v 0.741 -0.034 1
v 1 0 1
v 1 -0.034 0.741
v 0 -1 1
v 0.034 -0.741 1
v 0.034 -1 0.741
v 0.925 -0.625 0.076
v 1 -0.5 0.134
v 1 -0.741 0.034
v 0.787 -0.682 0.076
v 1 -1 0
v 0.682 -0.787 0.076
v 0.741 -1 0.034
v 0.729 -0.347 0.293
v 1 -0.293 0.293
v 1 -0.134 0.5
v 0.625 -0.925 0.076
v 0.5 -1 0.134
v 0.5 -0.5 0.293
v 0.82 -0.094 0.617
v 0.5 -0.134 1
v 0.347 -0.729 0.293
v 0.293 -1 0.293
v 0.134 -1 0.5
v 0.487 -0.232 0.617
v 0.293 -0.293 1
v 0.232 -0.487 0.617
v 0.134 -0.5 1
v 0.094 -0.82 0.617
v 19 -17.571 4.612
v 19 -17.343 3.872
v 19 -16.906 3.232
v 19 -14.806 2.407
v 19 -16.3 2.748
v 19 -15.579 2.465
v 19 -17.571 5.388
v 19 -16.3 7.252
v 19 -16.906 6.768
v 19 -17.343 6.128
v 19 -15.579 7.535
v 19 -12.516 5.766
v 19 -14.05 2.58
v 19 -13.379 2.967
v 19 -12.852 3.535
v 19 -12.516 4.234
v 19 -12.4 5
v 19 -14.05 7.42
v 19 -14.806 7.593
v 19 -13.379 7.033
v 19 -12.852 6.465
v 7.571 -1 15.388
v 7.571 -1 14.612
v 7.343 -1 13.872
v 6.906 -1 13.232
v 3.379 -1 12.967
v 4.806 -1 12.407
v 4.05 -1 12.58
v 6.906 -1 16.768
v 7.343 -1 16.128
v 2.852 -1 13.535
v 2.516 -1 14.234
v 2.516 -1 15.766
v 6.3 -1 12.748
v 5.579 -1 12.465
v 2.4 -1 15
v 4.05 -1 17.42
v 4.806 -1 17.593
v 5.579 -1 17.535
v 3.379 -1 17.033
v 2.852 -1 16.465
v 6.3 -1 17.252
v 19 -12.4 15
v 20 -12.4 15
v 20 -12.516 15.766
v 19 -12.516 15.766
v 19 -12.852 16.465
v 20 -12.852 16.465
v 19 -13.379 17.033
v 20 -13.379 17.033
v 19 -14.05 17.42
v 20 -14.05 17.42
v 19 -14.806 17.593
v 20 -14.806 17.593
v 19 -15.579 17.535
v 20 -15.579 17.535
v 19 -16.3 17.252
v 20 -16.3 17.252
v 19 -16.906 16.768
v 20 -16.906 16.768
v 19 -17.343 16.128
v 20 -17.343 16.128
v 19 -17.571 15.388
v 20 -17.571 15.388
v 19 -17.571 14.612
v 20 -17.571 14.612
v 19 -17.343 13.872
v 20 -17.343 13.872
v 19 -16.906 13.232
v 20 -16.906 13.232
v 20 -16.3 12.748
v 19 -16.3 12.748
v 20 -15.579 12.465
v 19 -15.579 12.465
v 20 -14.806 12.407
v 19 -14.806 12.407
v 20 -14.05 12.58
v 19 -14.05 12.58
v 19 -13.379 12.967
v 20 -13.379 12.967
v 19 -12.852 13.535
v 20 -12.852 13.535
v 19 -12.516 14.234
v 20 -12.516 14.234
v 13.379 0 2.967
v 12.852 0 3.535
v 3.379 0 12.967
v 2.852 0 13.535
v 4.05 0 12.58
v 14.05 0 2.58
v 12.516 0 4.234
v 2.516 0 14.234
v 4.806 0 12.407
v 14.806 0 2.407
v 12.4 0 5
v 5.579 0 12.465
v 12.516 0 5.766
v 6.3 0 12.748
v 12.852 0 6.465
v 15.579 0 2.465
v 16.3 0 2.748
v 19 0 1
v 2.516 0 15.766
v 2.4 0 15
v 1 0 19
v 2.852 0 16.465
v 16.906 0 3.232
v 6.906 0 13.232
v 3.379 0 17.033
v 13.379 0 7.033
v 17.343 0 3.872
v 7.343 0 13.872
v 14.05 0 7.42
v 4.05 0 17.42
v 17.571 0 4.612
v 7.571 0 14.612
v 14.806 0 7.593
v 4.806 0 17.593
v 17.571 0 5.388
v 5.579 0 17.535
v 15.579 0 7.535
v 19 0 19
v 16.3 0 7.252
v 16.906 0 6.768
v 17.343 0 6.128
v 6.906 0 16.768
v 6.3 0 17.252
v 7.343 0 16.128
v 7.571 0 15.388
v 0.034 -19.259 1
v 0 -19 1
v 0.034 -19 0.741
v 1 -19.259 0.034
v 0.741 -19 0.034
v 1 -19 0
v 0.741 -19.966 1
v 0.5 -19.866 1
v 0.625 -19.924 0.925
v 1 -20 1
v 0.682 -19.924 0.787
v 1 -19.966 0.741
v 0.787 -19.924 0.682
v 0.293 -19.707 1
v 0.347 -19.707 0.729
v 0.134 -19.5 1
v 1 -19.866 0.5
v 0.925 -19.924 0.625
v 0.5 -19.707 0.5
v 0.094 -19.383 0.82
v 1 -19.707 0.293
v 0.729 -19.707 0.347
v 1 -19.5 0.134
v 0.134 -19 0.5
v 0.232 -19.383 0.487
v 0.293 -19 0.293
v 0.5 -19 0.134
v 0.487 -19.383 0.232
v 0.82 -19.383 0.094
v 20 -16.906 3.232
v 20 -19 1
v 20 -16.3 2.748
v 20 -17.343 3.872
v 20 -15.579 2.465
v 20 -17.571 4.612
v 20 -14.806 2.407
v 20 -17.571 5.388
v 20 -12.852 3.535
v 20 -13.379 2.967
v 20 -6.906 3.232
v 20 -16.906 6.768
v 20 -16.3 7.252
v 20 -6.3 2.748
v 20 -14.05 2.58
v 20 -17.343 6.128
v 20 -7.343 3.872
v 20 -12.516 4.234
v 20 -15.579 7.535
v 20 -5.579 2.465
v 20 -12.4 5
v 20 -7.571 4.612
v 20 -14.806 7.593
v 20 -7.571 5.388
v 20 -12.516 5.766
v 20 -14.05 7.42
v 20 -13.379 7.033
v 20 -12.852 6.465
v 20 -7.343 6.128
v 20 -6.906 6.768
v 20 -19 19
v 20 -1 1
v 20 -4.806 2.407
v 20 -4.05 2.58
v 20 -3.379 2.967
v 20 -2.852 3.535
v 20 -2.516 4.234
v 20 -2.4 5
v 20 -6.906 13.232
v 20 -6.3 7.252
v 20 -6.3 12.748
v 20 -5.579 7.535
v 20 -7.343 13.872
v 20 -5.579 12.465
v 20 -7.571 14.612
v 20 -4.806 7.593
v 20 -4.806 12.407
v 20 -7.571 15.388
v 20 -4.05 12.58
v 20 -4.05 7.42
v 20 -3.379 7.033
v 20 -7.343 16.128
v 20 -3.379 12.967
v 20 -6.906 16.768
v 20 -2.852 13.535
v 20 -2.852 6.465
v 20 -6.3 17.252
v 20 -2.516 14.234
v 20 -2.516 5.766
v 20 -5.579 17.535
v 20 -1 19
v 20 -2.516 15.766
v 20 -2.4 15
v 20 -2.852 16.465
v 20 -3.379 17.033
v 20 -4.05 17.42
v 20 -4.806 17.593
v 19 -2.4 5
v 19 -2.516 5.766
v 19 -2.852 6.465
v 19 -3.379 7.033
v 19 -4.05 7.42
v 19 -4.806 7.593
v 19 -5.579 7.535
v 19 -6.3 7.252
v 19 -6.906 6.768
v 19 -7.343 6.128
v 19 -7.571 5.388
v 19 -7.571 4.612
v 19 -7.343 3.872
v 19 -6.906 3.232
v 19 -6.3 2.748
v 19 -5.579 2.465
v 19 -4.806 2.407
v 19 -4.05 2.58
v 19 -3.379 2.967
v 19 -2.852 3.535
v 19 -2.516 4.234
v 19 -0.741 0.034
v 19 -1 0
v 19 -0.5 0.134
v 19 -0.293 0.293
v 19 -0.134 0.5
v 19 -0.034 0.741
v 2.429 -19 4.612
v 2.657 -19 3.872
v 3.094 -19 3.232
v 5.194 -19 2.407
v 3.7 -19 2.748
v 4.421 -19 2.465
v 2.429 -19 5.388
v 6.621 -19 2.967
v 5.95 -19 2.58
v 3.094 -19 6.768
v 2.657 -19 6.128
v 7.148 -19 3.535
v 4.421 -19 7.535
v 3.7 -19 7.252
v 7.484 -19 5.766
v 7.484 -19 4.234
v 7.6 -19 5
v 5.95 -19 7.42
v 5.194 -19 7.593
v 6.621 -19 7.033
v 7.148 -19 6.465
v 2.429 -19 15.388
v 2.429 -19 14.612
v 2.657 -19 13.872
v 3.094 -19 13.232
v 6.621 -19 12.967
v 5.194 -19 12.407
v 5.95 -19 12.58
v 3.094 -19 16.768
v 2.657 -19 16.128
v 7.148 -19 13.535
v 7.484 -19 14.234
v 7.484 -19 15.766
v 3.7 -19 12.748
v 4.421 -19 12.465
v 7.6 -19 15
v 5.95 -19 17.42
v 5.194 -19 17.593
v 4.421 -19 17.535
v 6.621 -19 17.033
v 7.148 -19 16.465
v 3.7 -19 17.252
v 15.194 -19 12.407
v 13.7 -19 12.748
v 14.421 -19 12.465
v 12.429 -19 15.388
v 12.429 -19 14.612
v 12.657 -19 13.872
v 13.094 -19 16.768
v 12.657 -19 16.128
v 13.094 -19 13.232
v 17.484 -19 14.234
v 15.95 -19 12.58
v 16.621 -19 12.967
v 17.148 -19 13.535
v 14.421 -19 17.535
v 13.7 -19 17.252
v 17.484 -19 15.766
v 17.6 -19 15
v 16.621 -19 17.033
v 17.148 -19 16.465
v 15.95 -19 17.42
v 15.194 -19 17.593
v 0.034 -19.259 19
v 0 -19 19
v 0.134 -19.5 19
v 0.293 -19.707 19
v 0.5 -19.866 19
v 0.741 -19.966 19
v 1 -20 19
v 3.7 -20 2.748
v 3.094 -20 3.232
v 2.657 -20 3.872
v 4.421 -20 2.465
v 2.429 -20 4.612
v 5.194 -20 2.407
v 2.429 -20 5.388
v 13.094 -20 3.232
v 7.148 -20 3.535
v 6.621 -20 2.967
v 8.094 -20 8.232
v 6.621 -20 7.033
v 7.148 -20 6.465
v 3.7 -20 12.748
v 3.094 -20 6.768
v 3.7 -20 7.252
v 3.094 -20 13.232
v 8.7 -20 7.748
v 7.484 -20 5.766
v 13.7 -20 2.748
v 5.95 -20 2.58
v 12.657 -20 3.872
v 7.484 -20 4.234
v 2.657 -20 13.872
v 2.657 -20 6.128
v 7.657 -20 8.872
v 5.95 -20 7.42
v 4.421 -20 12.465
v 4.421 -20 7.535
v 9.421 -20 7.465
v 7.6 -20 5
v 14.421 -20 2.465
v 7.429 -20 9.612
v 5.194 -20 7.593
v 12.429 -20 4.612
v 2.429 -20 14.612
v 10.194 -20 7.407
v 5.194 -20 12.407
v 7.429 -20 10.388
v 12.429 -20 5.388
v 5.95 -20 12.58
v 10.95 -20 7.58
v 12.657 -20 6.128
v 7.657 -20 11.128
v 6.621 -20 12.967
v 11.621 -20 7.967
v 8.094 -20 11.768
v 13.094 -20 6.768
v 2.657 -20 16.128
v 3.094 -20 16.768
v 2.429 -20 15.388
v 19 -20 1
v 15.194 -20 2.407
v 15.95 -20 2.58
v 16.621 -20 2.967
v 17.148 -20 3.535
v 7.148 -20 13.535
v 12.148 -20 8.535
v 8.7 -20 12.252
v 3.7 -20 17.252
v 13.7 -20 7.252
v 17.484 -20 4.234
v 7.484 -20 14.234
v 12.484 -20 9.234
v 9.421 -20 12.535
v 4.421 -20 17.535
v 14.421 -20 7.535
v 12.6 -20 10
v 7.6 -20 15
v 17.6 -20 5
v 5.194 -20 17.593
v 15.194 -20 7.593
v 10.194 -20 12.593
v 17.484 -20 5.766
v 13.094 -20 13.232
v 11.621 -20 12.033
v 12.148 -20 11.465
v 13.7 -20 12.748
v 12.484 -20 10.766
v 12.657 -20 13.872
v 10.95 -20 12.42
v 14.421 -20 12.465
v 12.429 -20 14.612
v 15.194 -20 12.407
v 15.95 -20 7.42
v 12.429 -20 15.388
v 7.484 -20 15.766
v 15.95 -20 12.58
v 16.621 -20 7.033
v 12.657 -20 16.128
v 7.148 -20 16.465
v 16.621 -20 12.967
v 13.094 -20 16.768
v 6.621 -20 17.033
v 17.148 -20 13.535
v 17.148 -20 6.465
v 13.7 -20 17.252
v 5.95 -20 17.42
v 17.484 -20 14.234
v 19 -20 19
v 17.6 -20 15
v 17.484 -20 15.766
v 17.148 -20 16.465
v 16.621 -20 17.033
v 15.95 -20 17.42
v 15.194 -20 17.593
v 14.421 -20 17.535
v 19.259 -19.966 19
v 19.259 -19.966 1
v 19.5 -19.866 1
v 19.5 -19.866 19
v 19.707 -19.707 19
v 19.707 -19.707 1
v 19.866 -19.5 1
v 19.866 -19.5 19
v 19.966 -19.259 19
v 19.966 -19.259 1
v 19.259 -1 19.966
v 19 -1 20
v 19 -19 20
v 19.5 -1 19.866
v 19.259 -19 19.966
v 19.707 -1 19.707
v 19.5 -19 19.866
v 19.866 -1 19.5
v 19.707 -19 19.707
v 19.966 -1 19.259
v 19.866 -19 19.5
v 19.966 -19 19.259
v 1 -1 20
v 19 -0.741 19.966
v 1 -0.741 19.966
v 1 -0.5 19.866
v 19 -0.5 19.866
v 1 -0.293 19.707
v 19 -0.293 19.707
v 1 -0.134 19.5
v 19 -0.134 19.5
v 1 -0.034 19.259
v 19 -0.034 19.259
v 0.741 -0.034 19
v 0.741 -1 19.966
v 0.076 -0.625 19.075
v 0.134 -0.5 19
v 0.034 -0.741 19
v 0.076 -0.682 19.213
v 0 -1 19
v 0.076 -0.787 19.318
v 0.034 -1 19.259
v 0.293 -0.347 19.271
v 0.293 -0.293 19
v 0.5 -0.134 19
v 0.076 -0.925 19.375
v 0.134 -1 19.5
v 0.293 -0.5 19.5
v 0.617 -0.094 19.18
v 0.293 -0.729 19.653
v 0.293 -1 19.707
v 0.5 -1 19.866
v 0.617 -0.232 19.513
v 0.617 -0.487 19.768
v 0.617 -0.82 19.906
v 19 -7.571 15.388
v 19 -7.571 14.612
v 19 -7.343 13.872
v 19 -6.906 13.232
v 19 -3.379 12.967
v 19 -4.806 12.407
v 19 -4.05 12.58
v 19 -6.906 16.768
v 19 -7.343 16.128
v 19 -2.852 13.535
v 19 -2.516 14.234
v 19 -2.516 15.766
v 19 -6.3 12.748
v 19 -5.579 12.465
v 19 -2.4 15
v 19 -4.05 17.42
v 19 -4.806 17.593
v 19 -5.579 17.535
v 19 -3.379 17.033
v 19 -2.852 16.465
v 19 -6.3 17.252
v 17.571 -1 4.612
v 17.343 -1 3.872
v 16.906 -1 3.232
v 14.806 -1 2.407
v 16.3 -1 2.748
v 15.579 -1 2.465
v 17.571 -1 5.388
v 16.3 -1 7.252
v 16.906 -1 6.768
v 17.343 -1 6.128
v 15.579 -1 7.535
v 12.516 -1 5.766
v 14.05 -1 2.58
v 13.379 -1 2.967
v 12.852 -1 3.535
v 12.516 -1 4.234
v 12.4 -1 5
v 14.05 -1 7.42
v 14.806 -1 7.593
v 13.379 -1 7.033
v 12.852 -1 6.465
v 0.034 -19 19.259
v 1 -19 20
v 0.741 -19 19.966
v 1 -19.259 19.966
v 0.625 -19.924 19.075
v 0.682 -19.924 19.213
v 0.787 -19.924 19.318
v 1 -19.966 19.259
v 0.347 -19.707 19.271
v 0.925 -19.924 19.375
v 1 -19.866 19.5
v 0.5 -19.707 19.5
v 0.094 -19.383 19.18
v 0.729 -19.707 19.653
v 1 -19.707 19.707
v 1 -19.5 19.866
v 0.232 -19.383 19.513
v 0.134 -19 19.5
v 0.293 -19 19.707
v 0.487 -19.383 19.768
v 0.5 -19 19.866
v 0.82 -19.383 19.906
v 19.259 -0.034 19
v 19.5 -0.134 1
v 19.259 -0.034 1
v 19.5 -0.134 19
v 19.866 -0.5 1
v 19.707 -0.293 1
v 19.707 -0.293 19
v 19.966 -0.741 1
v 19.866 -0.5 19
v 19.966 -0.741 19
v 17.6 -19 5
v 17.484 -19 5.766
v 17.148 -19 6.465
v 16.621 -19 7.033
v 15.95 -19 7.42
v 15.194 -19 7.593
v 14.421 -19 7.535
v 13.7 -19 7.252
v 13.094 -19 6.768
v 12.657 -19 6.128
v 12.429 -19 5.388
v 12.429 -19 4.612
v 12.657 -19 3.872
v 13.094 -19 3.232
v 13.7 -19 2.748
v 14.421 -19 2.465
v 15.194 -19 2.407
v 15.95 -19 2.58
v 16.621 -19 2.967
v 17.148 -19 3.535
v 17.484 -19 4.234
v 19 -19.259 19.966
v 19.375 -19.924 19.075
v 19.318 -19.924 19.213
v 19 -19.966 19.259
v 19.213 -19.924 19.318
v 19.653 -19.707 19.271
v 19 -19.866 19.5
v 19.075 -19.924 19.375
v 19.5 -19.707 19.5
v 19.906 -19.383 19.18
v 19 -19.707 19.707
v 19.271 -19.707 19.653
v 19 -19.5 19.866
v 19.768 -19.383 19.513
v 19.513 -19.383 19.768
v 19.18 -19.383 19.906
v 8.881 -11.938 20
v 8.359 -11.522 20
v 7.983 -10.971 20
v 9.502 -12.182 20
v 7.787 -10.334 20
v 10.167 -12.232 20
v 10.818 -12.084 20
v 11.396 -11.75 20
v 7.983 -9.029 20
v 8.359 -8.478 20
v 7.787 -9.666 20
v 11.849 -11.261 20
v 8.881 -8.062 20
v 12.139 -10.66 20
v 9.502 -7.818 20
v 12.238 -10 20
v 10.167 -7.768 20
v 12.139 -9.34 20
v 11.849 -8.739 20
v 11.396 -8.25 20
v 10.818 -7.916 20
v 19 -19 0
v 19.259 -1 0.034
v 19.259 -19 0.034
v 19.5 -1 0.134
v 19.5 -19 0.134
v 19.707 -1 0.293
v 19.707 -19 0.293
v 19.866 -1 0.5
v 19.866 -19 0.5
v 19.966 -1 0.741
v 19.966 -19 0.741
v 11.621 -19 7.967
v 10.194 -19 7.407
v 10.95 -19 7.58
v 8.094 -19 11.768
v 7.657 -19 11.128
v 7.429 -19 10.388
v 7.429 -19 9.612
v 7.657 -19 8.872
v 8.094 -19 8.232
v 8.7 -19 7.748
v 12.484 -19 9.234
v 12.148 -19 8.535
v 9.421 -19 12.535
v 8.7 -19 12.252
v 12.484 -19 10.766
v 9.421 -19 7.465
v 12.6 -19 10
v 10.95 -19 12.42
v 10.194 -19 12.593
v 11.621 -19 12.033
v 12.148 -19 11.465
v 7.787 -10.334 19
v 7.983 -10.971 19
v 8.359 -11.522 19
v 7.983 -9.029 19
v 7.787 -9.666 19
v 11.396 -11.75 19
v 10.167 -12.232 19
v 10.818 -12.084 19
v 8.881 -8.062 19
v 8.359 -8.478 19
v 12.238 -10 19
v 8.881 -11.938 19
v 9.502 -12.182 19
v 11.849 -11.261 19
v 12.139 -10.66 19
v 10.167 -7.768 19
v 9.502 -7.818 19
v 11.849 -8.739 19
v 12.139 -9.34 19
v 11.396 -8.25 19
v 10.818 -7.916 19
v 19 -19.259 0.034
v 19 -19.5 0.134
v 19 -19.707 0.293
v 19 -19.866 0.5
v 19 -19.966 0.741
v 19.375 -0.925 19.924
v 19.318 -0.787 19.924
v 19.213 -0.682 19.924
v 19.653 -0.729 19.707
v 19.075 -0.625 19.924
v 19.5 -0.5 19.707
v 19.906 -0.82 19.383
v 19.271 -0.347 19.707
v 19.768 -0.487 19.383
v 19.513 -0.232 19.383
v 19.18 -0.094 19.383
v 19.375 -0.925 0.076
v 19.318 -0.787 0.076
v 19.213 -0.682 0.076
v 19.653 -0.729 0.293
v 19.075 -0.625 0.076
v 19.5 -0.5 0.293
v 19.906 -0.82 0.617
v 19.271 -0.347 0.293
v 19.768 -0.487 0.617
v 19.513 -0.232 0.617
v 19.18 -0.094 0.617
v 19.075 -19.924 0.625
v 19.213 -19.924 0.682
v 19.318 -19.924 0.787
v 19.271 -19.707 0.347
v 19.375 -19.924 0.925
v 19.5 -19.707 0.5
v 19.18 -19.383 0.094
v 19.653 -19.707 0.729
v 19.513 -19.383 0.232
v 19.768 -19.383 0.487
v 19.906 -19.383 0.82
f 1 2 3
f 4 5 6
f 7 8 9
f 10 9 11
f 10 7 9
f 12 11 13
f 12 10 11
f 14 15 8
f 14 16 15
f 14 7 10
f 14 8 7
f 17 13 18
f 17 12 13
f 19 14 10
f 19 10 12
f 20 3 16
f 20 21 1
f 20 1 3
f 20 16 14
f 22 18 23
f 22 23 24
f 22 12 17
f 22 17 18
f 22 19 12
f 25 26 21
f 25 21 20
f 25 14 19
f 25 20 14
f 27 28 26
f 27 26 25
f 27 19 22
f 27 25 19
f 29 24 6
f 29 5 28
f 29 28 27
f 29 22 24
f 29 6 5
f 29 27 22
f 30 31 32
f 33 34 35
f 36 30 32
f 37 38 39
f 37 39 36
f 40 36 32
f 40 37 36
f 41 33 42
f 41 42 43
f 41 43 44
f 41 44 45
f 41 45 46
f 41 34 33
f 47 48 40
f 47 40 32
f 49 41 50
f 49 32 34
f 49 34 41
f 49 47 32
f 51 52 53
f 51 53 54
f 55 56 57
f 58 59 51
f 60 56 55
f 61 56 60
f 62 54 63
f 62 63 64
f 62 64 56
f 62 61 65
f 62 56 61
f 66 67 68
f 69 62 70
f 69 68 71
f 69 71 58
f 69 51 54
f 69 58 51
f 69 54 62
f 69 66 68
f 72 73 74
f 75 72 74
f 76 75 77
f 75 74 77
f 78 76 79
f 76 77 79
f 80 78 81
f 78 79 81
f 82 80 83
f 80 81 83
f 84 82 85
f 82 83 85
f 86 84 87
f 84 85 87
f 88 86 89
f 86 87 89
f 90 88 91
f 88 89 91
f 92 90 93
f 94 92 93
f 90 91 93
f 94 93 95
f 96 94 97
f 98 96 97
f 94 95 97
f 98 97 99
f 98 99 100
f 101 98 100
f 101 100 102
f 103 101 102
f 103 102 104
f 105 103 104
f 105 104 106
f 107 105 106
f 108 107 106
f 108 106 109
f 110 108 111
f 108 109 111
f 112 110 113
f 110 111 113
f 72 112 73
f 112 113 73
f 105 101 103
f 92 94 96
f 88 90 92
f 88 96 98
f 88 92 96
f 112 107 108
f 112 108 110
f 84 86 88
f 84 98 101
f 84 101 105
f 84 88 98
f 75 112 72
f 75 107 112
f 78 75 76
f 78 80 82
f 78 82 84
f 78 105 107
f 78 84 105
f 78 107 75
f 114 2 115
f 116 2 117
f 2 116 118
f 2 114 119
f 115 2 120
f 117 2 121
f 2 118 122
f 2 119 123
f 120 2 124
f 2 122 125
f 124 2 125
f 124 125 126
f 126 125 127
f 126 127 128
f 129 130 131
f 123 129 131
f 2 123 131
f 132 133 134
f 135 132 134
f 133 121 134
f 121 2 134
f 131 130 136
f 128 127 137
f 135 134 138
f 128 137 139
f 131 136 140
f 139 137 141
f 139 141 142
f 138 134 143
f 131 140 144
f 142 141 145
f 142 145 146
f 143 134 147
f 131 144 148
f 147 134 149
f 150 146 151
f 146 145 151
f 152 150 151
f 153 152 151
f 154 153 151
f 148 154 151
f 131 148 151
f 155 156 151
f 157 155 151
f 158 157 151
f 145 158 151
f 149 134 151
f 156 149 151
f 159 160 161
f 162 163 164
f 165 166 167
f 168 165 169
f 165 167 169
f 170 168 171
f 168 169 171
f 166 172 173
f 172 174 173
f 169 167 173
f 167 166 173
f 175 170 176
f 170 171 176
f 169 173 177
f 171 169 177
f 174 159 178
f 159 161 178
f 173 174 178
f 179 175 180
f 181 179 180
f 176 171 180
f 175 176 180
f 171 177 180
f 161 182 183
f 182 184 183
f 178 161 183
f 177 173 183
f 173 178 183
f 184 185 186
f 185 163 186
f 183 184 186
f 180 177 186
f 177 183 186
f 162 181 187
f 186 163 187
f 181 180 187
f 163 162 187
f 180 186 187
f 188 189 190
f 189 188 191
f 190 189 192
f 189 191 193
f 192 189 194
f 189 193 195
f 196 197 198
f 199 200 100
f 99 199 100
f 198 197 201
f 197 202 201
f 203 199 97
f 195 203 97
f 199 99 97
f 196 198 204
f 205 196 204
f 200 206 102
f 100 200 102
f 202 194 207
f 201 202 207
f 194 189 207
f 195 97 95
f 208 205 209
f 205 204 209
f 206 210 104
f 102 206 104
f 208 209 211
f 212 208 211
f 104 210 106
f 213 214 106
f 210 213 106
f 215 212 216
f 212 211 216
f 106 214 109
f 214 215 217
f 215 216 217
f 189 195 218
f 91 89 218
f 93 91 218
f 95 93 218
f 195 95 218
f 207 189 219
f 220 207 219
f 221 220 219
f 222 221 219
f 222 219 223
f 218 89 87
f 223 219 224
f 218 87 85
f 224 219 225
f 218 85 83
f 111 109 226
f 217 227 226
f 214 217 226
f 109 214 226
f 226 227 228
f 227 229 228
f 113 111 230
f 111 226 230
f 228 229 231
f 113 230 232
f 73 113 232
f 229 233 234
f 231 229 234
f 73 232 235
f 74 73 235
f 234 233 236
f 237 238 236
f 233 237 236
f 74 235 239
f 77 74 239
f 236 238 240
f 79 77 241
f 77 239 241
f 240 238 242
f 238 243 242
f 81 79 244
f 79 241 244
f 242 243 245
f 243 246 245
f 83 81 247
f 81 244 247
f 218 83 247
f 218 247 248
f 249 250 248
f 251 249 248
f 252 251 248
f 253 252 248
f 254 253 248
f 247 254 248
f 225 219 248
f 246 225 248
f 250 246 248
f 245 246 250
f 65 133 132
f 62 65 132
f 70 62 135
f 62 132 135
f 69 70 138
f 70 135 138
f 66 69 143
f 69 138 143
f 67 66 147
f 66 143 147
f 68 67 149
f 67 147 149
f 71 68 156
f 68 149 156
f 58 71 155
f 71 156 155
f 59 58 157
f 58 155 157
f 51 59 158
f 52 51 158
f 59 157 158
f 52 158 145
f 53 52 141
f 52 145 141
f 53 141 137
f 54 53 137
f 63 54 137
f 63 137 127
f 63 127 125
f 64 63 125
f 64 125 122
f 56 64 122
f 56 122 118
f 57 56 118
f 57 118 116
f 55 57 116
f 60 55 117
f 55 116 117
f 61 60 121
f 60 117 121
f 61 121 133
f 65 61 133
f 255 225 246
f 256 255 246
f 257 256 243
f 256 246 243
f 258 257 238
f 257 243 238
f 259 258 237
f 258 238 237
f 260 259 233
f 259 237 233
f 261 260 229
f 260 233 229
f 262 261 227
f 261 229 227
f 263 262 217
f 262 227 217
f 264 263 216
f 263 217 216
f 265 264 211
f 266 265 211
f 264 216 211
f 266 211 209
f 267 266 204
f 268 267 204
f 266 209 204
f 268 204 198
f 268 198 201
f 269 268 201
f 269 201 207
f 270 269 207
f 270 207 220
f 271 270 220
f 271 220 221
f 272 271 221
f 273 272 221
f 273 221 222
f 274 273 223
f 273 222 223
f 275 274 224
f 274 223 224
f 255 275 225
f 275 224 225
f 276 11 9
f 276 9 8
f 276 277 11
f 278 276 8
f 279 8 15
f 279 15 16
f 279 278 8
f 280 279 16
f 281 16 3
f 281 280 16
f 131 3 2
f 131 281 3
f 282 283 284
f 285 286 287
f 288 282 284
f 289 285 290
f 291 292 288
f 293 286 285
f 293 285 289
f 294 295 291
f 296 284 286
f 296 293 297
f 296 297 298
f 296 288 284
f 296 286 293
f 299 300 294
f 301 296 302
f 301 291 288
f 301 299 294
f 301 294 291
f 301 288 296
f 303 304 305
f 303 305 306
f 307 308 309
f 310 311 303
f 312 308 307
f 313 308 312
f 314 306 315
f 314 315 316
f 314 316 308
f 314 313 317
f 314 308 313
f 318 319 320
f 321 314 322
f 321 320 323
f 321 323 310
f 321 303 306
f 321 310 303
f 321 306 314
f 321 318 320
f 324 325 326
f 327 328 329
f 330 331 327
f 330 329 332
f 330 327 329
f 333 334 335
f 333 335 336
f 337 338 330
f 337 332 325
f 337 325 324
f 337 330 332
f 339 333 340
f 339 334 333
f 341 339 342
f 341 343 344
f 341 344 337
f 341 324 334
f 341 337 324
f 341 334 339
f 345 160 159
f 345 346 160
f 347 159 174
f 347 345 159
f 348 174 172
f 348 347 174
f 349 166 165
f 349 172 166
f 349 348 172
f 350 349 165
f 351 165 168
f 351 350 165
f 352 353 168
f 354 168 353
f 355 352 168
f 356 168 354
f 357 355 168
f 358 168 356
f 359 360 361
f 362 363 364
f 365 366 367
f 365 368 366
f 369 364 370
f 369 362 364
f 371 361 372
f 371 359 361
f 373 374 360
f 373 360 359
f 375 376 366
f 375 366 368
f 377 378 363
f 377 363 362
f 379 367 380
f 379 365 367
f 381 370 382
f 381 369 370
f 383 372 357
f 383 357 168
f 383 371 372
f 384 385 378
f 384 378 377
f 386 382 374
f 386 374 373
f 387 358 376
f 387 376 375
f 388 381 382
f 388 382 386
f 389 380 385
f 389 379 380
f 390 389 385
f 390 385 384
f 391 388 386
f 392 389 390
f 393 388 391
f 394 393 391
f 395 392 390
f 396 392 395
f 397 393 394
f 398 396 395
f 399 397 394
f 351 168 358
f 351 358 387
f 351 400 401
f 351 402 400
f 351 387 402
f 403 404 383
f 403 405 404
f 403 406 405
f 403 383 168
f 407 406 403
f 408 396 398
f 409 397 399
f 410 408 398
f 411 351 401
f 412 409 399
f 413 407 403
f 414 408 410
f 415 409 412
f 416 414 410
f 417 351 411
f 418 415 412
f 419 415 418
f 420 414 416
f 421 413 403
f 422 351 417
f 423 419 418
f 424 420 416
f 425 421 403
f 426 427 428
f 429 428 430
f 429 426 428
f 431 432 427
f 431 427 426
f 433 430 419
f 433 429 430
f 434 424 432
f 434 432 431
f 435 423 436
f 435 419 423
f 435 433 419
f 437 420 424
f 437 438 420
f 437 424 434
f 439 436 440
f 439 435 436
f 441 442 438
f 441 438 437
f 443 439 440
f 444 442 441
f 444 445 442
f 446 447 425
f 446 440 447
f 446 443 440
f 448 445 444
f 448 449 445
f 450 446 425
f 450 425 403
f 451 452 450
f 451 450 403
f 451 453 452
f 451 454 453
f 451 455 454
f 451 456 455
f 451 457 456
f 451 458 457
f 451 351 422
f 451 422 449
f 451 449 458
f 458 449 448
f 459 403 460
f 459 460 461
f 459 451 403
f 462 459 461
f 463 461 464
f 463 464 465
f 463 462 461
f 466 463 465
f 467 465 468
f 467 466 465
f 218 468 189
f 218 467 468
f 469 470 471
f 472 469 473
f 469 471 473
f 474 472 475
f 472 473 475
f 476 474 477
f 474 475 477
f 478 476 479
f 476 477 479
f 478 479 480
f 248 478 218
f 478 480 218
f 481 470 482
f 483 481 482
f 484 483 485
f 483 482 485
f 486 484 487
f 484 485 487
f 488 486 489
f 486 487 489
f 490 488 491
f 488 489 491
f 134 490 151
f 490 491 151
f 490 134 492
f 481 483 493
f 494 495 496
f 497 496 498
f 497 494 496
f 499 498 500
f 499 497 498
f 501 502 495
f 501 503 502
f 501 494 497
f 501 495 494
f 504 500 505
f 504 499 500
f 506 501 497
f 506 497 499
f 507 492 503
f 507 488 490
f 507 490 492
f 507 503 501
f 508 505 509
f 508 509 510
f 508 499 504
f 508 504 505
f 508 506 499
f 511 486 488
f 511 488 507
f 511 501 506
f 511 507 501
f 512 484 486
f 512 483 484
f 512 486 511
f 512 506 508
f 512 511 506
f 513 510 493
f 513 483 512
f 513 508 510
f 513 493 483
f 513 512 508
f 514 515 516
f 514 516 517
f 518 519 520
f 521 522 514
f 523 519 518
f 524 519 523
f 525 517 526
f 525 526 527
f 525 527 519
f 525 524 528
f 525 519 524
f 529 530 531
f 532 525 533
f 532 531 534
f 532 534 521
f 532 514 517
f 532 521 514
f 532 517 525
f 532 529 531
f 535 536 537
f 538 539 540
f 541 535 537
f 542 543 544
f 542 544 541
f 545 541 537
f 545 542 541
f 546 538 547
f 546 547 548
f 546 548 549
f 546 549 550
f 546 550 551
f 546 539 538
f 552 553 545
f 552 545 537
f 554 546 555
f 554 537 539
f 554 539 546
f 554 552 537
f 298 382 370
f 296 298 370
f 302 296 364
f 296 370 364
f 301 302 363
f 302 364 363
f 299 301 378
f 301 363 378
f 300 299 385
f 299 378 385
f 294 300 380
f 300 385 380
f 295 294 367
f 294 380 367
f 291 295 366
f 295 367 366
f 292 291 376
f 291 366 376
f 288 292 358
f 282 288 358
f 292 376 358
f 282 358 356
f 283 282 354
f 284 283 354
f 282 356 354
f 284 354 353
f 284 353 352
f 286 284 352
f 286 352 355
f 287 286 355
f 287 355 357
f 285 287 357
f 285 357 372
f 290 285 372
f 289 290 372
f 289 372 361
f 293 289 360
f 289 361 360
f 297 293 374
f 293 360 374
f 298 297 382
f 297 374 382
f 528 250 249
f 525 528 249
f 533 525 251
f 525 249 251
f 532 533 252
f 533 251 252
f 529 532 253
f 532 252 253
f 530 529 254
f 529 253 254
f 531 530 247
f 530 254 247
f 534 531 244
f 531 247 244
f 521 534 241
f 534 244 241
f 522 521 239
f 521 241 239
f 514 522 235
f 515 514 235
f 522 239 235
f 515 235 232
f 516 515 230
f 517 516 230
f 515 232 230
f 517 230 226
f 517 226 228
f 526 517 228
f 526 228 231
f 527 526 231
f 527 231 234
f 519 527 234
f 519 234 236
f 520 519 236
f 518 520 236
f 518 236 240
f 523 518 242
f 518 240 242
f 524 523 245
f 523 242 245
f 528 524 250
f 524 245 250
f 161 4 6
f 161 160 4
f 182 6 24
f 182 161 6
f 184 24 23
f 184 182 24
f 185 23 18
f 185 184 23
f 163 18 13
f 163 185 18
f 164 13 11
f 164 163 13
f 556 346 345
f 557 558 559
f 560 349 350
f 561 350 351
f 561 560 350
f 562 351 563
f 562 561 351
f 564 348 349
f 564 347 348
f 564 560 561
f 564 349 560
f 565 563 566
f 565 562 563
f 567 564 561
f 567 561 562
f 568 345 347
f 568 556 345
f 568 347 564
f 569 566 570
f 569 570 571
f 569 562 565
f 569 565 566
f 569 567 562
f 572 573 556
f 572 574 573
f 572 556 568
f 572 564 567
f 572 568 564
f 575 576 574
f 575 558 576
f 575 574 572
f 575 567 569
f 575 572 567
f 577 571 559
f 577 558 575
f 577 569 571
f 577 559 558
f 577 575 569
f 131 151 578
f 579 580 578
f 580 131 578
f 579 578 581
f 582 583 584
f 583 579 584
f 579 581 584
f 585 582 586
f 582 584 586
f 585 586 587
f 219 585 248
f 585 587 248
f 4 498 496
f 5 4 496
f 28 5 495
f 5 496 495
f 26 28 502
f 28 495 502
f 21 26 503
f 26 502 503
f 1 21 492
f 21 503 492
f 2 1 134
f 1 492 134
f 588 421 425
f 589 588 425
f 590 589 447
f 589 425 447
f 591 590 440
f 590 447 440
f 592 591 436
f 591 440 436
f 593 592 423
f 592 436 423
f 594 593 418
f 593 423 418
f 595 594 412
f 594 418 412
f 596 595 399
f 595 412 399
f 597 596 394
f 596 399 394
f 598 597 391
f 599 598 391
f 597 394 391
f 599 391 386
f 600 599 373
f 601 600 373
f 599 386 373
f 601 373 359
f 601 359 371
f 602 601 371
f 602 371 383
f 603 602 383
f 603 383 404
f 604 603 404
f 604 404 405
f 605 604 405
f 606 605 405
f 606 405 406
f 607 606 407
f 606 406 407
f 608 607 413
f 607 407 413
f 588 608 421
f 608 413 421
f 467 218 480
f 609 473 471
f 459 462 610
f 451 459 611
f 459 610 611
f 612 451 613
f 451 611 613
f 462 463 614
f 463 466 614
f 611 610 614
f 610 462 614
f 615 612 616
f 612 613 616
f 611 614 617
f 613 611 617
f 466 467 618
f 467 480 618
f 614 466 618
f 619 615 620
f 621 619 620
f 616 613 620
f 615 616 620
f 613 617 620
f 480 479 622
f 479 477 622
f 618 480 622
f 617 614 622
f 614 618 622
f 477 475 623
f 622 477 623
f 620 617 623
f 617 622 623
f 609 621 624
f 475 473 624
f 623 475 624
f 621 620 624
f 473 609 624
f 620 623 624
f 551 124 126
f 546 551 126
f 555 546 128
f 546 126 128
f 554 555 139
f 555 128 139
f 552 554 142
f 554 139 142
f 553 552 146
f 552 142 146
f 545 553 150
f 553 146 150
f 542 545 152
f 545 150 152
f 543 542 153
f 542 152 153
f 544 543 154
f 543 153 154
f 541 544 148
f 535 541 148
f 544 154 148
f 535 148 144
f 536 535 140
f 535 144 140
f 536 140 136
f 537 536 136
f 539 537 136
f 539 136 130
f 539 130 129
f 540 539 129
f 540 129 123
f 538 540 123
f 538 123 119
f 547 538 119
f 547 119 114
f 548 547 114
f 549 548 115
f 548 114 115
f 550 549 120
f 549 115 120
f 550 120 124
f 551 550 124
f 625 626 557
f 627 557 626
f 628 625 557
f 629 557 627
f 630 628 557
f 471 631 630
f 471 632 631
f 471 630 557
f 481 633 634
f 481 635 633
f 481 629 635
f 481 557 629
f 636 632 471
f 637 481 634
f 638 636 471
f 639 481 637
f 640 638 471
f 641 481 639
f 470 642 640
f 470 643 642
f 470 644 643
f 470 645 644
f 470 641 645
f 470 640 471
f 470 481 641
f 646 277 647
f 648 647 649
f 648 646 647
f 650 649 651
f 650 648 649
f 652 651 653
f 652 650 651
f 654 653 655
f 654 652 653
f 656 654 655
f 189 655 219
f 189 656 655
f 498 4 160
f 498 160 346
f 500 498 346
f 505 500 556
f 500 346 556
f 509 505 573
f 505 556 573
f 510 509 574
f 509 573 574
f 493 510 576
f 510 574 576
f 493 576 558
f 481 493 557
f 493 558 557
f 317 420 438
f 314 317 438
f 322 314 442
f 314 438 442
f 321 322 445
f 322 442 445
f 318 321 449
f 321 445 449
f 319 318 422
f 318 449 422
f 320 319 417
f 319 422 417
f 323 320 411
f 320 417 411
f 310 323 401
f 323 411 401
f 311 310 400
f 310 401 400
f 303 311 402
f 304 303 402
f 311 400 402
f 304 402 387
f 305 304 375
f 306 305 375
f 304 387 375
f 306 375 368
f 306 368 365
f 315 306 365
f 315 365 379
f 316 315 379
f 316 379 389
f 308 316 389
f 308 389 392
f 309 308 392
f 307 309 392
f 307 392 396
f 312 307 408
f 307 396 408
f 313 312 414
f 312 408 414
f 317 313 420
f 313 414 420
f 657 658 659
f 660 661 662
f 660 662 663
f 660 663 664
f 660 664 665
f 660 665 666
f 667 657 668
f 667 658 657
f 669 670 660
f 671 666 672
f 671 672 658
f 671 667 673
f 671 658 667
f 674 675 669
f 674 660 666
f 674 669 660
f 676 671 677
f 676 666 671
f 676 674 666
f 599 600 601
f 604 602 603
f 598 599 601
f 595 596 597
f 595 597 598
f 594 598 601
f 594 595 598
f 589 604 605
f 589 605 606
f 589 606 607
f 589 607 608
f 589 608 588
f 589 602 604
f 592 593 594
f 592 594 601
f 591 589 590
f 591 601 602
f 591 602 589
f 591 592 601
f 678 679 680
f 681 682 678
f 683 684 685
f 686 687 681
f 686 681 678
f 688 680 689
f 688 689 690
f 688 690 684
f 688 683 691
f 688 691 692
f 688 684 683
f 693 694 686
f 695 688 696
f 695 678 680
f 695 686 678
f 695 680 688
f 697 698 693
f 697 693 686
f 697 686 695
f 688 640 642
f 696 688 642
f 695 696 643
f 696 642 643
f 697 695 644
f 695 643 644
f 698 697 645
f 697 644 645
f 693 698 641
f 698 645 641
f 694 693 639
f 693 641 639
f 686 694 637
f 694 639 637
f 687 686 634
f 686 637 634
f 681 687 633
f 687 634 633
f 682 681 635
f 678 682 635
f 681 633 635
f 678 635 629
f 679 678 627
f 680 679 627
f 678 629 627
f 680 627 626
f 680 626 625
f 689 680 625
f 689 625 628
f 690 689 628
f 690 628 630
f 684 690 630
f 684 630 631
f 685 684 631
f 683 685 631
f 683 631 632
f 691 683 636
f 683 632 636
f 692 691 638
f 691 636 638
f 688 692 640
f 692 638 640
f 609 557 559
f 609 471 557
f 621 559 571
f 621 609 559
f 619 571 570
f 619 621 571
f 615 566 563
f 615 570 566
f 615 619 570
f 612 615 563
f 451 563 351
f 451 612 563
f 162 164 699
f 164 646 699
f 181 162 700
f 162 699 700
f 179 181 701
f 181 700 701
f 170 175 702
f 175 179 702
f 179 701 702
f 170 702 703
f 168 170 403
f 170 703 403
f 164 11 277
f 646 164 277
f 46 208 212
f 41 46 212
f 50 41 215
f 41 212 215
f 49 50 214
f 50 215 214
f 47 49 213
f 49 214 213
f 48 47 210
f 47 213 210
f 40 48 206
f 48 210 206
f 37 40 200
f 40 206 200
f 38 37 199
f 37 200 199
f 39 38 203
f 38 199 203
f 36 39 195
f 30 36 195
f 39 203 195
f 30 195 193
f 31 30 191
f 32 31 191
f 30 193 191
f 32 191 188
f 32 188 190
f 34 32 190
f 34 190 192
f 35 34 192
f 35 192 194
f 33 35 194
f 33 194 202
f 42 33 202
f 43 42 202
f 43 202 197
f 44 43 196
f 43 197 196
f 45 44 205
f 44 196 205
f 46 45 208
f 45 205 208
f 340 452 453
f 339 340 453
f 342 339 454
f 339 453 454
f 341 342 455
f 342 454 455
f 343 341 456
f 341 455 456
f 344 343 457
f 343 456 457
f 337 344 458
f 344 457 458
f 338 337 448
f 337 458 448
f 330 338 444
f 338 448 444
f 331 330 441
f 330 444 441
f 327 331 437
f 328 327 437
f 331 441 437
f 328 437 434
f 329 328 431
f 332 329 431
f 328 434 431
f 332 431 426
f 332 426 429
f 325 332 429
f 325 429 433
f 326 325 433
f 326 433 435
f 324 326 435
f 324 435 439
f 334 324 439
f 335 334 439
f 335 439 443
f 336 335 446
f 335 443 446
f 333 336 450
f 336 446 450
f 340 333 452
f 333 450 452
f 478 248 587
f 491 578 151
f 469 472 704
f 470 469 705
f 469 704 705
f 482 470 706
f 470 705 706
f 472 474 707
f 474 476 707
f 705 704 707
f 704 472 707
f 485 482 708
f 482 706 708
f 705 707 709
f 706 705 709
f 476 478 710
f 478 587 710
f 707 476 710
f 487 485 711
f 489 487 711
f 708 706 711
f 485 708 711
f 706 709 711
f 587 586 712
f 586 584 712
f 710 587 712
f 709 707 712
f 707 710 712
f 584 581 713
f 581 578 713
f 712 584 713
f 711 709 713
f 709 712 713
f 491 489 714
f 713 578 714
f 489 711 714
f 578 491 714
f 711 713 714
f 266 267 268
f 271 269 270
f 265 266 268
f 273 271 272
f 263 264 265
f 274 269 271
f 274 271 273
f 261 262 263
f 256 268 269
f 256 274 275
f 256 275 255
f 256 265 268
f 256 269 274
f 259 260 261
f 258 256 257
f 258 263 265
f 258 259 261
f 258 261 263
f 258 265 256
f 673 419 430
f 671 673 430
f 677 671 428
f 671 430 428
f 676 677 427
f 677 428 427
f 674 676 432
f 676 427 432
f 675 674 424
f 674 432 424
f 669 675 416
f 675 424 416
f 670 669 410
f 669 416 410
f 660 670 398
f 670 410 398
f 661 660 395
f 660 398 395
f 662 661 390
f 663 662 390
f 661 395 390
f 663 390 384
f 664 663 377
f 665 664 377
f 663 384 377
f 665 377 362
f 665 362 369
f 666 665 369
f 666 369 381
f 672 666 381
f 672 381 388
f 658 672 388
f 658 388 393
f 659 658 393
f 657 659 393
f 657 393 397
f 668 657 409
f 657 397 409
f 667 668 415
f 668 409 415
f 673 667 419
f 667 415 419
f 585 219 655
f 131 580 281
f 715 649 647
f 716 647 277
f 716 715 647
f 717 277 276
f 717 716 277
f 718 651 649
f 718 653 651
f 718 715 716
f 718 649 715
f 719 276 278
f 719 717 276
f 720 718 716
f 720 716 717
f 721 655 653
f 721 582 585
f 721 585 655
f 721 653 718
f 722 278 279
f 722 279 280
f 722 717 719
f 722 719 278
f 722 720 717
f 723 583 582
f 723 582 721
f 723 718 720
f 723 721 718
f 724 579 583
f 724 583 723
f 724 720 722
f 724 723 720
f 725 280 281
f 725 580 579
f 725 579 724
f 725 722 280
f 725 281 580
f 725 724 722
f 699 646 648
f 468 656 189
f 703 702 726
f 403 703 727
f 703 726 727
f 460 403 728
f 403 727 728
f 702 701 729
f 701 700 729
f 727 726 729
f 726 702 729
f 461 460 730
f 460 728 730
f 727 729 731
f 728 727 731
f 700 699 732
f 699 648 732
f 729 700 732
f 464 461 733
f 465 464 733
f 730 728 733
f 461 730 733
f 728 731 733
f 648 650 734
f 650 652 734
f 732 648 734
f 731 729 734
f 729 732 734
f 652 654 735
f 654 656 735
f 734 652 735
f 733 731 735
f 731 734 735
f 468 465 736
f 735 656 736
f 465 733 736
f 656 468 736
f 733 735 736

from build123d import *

# Parameters (mm, degrees)
F0_W     = 20
F0_H     = 20
F1_DEPTH = 20
F2_R     = 2.6
F3_DEPTH = 1
F4_R     = 2.6
F5_DEPTH = 1
F6_R     = 2.238333
F7_DEPTH = 1
F8_R     = 2.6
F9_DEPTH = 1
F10_R    = 1


with BuildPart() as f1:
    # F0 (on Front) → F1 (new body)
    with BuildSketch(Plane.XZ):
        with Locations((10, 10)):
            Rectangle(F0_W, F0_H)
    extrude(amount=F1_DEPTH)

    # F2 (on face) → F3 (cut)
    with BuildSketch(Plane.XZ.offset(20)):
        with Locations((10, 10)):
            Circle(F2_R)
        with Locations((5, 15)):
            Circle(F2_R)
        with Locations((15, 5)):
            Circle(F2_R)
        with Locations((15, 15)):
            Circle(F2_R)
        with Locations((5, 5)):
            Circle(F2_R)
    extrude(amount=-F3_DEPTH, mode=Mode.SUBTRACT)

    # F4 (on face) → F5 (cut)
    with BuildSketch(Plane(origin=(0, 0, 0), x_dir=(-1, 0, 0), z_dir=(0, 1, 0))):
        with Locations((-5, 15)):
            Circle(F4_R)
        with Locations((-15, 5)):
            Circle(F4_R)
    extrude(amount=-F5_DEPTH, mode=Mode.SUBTRACT)

    # F6 (on face) → F7 (cut)
    with BuildSketch(Plane.XY.offset(20)):
        with Locations((10, -10)):
            Circle(F6_R)
    extrude(amount=-F7_DEPTH, mode=Mode.SUBTRACT)

    # F8 (on face) → F9 (cut)
    with BuildSketch(Plane.YZ.offset(20)):
        with Locations((-15, 5)):
            Circle(F8_R)
        with Locations((-15, 15)):
            Circle(F8_R)
        with Locations((-5, 15)):
            Circle(F8_R)
        with Locations((-5, 5)):
            Circle(F8_R)
    extrude(amount=-F9_DEPTH, mode=Mode.SUBTRACT)

    # F10
    f10_edges = [f1.edges().sort_by_distance(p)[0] for p in [
        (20, 0, 10),
        (20, -10, 20),
        (10, 0, 20),
        (0, 0, 10),
        (0, -10, 20),
        (20, -10, 0),
        (10, 0, 0),
        (0, -10, 0),
        (0, -20, 10),
        (10, -20, 0),
        (20, -20, 10),
        (10, -20, 20),
    ]]
    fillet(f10_edges, radius=F10_R)


solid = f1.part
